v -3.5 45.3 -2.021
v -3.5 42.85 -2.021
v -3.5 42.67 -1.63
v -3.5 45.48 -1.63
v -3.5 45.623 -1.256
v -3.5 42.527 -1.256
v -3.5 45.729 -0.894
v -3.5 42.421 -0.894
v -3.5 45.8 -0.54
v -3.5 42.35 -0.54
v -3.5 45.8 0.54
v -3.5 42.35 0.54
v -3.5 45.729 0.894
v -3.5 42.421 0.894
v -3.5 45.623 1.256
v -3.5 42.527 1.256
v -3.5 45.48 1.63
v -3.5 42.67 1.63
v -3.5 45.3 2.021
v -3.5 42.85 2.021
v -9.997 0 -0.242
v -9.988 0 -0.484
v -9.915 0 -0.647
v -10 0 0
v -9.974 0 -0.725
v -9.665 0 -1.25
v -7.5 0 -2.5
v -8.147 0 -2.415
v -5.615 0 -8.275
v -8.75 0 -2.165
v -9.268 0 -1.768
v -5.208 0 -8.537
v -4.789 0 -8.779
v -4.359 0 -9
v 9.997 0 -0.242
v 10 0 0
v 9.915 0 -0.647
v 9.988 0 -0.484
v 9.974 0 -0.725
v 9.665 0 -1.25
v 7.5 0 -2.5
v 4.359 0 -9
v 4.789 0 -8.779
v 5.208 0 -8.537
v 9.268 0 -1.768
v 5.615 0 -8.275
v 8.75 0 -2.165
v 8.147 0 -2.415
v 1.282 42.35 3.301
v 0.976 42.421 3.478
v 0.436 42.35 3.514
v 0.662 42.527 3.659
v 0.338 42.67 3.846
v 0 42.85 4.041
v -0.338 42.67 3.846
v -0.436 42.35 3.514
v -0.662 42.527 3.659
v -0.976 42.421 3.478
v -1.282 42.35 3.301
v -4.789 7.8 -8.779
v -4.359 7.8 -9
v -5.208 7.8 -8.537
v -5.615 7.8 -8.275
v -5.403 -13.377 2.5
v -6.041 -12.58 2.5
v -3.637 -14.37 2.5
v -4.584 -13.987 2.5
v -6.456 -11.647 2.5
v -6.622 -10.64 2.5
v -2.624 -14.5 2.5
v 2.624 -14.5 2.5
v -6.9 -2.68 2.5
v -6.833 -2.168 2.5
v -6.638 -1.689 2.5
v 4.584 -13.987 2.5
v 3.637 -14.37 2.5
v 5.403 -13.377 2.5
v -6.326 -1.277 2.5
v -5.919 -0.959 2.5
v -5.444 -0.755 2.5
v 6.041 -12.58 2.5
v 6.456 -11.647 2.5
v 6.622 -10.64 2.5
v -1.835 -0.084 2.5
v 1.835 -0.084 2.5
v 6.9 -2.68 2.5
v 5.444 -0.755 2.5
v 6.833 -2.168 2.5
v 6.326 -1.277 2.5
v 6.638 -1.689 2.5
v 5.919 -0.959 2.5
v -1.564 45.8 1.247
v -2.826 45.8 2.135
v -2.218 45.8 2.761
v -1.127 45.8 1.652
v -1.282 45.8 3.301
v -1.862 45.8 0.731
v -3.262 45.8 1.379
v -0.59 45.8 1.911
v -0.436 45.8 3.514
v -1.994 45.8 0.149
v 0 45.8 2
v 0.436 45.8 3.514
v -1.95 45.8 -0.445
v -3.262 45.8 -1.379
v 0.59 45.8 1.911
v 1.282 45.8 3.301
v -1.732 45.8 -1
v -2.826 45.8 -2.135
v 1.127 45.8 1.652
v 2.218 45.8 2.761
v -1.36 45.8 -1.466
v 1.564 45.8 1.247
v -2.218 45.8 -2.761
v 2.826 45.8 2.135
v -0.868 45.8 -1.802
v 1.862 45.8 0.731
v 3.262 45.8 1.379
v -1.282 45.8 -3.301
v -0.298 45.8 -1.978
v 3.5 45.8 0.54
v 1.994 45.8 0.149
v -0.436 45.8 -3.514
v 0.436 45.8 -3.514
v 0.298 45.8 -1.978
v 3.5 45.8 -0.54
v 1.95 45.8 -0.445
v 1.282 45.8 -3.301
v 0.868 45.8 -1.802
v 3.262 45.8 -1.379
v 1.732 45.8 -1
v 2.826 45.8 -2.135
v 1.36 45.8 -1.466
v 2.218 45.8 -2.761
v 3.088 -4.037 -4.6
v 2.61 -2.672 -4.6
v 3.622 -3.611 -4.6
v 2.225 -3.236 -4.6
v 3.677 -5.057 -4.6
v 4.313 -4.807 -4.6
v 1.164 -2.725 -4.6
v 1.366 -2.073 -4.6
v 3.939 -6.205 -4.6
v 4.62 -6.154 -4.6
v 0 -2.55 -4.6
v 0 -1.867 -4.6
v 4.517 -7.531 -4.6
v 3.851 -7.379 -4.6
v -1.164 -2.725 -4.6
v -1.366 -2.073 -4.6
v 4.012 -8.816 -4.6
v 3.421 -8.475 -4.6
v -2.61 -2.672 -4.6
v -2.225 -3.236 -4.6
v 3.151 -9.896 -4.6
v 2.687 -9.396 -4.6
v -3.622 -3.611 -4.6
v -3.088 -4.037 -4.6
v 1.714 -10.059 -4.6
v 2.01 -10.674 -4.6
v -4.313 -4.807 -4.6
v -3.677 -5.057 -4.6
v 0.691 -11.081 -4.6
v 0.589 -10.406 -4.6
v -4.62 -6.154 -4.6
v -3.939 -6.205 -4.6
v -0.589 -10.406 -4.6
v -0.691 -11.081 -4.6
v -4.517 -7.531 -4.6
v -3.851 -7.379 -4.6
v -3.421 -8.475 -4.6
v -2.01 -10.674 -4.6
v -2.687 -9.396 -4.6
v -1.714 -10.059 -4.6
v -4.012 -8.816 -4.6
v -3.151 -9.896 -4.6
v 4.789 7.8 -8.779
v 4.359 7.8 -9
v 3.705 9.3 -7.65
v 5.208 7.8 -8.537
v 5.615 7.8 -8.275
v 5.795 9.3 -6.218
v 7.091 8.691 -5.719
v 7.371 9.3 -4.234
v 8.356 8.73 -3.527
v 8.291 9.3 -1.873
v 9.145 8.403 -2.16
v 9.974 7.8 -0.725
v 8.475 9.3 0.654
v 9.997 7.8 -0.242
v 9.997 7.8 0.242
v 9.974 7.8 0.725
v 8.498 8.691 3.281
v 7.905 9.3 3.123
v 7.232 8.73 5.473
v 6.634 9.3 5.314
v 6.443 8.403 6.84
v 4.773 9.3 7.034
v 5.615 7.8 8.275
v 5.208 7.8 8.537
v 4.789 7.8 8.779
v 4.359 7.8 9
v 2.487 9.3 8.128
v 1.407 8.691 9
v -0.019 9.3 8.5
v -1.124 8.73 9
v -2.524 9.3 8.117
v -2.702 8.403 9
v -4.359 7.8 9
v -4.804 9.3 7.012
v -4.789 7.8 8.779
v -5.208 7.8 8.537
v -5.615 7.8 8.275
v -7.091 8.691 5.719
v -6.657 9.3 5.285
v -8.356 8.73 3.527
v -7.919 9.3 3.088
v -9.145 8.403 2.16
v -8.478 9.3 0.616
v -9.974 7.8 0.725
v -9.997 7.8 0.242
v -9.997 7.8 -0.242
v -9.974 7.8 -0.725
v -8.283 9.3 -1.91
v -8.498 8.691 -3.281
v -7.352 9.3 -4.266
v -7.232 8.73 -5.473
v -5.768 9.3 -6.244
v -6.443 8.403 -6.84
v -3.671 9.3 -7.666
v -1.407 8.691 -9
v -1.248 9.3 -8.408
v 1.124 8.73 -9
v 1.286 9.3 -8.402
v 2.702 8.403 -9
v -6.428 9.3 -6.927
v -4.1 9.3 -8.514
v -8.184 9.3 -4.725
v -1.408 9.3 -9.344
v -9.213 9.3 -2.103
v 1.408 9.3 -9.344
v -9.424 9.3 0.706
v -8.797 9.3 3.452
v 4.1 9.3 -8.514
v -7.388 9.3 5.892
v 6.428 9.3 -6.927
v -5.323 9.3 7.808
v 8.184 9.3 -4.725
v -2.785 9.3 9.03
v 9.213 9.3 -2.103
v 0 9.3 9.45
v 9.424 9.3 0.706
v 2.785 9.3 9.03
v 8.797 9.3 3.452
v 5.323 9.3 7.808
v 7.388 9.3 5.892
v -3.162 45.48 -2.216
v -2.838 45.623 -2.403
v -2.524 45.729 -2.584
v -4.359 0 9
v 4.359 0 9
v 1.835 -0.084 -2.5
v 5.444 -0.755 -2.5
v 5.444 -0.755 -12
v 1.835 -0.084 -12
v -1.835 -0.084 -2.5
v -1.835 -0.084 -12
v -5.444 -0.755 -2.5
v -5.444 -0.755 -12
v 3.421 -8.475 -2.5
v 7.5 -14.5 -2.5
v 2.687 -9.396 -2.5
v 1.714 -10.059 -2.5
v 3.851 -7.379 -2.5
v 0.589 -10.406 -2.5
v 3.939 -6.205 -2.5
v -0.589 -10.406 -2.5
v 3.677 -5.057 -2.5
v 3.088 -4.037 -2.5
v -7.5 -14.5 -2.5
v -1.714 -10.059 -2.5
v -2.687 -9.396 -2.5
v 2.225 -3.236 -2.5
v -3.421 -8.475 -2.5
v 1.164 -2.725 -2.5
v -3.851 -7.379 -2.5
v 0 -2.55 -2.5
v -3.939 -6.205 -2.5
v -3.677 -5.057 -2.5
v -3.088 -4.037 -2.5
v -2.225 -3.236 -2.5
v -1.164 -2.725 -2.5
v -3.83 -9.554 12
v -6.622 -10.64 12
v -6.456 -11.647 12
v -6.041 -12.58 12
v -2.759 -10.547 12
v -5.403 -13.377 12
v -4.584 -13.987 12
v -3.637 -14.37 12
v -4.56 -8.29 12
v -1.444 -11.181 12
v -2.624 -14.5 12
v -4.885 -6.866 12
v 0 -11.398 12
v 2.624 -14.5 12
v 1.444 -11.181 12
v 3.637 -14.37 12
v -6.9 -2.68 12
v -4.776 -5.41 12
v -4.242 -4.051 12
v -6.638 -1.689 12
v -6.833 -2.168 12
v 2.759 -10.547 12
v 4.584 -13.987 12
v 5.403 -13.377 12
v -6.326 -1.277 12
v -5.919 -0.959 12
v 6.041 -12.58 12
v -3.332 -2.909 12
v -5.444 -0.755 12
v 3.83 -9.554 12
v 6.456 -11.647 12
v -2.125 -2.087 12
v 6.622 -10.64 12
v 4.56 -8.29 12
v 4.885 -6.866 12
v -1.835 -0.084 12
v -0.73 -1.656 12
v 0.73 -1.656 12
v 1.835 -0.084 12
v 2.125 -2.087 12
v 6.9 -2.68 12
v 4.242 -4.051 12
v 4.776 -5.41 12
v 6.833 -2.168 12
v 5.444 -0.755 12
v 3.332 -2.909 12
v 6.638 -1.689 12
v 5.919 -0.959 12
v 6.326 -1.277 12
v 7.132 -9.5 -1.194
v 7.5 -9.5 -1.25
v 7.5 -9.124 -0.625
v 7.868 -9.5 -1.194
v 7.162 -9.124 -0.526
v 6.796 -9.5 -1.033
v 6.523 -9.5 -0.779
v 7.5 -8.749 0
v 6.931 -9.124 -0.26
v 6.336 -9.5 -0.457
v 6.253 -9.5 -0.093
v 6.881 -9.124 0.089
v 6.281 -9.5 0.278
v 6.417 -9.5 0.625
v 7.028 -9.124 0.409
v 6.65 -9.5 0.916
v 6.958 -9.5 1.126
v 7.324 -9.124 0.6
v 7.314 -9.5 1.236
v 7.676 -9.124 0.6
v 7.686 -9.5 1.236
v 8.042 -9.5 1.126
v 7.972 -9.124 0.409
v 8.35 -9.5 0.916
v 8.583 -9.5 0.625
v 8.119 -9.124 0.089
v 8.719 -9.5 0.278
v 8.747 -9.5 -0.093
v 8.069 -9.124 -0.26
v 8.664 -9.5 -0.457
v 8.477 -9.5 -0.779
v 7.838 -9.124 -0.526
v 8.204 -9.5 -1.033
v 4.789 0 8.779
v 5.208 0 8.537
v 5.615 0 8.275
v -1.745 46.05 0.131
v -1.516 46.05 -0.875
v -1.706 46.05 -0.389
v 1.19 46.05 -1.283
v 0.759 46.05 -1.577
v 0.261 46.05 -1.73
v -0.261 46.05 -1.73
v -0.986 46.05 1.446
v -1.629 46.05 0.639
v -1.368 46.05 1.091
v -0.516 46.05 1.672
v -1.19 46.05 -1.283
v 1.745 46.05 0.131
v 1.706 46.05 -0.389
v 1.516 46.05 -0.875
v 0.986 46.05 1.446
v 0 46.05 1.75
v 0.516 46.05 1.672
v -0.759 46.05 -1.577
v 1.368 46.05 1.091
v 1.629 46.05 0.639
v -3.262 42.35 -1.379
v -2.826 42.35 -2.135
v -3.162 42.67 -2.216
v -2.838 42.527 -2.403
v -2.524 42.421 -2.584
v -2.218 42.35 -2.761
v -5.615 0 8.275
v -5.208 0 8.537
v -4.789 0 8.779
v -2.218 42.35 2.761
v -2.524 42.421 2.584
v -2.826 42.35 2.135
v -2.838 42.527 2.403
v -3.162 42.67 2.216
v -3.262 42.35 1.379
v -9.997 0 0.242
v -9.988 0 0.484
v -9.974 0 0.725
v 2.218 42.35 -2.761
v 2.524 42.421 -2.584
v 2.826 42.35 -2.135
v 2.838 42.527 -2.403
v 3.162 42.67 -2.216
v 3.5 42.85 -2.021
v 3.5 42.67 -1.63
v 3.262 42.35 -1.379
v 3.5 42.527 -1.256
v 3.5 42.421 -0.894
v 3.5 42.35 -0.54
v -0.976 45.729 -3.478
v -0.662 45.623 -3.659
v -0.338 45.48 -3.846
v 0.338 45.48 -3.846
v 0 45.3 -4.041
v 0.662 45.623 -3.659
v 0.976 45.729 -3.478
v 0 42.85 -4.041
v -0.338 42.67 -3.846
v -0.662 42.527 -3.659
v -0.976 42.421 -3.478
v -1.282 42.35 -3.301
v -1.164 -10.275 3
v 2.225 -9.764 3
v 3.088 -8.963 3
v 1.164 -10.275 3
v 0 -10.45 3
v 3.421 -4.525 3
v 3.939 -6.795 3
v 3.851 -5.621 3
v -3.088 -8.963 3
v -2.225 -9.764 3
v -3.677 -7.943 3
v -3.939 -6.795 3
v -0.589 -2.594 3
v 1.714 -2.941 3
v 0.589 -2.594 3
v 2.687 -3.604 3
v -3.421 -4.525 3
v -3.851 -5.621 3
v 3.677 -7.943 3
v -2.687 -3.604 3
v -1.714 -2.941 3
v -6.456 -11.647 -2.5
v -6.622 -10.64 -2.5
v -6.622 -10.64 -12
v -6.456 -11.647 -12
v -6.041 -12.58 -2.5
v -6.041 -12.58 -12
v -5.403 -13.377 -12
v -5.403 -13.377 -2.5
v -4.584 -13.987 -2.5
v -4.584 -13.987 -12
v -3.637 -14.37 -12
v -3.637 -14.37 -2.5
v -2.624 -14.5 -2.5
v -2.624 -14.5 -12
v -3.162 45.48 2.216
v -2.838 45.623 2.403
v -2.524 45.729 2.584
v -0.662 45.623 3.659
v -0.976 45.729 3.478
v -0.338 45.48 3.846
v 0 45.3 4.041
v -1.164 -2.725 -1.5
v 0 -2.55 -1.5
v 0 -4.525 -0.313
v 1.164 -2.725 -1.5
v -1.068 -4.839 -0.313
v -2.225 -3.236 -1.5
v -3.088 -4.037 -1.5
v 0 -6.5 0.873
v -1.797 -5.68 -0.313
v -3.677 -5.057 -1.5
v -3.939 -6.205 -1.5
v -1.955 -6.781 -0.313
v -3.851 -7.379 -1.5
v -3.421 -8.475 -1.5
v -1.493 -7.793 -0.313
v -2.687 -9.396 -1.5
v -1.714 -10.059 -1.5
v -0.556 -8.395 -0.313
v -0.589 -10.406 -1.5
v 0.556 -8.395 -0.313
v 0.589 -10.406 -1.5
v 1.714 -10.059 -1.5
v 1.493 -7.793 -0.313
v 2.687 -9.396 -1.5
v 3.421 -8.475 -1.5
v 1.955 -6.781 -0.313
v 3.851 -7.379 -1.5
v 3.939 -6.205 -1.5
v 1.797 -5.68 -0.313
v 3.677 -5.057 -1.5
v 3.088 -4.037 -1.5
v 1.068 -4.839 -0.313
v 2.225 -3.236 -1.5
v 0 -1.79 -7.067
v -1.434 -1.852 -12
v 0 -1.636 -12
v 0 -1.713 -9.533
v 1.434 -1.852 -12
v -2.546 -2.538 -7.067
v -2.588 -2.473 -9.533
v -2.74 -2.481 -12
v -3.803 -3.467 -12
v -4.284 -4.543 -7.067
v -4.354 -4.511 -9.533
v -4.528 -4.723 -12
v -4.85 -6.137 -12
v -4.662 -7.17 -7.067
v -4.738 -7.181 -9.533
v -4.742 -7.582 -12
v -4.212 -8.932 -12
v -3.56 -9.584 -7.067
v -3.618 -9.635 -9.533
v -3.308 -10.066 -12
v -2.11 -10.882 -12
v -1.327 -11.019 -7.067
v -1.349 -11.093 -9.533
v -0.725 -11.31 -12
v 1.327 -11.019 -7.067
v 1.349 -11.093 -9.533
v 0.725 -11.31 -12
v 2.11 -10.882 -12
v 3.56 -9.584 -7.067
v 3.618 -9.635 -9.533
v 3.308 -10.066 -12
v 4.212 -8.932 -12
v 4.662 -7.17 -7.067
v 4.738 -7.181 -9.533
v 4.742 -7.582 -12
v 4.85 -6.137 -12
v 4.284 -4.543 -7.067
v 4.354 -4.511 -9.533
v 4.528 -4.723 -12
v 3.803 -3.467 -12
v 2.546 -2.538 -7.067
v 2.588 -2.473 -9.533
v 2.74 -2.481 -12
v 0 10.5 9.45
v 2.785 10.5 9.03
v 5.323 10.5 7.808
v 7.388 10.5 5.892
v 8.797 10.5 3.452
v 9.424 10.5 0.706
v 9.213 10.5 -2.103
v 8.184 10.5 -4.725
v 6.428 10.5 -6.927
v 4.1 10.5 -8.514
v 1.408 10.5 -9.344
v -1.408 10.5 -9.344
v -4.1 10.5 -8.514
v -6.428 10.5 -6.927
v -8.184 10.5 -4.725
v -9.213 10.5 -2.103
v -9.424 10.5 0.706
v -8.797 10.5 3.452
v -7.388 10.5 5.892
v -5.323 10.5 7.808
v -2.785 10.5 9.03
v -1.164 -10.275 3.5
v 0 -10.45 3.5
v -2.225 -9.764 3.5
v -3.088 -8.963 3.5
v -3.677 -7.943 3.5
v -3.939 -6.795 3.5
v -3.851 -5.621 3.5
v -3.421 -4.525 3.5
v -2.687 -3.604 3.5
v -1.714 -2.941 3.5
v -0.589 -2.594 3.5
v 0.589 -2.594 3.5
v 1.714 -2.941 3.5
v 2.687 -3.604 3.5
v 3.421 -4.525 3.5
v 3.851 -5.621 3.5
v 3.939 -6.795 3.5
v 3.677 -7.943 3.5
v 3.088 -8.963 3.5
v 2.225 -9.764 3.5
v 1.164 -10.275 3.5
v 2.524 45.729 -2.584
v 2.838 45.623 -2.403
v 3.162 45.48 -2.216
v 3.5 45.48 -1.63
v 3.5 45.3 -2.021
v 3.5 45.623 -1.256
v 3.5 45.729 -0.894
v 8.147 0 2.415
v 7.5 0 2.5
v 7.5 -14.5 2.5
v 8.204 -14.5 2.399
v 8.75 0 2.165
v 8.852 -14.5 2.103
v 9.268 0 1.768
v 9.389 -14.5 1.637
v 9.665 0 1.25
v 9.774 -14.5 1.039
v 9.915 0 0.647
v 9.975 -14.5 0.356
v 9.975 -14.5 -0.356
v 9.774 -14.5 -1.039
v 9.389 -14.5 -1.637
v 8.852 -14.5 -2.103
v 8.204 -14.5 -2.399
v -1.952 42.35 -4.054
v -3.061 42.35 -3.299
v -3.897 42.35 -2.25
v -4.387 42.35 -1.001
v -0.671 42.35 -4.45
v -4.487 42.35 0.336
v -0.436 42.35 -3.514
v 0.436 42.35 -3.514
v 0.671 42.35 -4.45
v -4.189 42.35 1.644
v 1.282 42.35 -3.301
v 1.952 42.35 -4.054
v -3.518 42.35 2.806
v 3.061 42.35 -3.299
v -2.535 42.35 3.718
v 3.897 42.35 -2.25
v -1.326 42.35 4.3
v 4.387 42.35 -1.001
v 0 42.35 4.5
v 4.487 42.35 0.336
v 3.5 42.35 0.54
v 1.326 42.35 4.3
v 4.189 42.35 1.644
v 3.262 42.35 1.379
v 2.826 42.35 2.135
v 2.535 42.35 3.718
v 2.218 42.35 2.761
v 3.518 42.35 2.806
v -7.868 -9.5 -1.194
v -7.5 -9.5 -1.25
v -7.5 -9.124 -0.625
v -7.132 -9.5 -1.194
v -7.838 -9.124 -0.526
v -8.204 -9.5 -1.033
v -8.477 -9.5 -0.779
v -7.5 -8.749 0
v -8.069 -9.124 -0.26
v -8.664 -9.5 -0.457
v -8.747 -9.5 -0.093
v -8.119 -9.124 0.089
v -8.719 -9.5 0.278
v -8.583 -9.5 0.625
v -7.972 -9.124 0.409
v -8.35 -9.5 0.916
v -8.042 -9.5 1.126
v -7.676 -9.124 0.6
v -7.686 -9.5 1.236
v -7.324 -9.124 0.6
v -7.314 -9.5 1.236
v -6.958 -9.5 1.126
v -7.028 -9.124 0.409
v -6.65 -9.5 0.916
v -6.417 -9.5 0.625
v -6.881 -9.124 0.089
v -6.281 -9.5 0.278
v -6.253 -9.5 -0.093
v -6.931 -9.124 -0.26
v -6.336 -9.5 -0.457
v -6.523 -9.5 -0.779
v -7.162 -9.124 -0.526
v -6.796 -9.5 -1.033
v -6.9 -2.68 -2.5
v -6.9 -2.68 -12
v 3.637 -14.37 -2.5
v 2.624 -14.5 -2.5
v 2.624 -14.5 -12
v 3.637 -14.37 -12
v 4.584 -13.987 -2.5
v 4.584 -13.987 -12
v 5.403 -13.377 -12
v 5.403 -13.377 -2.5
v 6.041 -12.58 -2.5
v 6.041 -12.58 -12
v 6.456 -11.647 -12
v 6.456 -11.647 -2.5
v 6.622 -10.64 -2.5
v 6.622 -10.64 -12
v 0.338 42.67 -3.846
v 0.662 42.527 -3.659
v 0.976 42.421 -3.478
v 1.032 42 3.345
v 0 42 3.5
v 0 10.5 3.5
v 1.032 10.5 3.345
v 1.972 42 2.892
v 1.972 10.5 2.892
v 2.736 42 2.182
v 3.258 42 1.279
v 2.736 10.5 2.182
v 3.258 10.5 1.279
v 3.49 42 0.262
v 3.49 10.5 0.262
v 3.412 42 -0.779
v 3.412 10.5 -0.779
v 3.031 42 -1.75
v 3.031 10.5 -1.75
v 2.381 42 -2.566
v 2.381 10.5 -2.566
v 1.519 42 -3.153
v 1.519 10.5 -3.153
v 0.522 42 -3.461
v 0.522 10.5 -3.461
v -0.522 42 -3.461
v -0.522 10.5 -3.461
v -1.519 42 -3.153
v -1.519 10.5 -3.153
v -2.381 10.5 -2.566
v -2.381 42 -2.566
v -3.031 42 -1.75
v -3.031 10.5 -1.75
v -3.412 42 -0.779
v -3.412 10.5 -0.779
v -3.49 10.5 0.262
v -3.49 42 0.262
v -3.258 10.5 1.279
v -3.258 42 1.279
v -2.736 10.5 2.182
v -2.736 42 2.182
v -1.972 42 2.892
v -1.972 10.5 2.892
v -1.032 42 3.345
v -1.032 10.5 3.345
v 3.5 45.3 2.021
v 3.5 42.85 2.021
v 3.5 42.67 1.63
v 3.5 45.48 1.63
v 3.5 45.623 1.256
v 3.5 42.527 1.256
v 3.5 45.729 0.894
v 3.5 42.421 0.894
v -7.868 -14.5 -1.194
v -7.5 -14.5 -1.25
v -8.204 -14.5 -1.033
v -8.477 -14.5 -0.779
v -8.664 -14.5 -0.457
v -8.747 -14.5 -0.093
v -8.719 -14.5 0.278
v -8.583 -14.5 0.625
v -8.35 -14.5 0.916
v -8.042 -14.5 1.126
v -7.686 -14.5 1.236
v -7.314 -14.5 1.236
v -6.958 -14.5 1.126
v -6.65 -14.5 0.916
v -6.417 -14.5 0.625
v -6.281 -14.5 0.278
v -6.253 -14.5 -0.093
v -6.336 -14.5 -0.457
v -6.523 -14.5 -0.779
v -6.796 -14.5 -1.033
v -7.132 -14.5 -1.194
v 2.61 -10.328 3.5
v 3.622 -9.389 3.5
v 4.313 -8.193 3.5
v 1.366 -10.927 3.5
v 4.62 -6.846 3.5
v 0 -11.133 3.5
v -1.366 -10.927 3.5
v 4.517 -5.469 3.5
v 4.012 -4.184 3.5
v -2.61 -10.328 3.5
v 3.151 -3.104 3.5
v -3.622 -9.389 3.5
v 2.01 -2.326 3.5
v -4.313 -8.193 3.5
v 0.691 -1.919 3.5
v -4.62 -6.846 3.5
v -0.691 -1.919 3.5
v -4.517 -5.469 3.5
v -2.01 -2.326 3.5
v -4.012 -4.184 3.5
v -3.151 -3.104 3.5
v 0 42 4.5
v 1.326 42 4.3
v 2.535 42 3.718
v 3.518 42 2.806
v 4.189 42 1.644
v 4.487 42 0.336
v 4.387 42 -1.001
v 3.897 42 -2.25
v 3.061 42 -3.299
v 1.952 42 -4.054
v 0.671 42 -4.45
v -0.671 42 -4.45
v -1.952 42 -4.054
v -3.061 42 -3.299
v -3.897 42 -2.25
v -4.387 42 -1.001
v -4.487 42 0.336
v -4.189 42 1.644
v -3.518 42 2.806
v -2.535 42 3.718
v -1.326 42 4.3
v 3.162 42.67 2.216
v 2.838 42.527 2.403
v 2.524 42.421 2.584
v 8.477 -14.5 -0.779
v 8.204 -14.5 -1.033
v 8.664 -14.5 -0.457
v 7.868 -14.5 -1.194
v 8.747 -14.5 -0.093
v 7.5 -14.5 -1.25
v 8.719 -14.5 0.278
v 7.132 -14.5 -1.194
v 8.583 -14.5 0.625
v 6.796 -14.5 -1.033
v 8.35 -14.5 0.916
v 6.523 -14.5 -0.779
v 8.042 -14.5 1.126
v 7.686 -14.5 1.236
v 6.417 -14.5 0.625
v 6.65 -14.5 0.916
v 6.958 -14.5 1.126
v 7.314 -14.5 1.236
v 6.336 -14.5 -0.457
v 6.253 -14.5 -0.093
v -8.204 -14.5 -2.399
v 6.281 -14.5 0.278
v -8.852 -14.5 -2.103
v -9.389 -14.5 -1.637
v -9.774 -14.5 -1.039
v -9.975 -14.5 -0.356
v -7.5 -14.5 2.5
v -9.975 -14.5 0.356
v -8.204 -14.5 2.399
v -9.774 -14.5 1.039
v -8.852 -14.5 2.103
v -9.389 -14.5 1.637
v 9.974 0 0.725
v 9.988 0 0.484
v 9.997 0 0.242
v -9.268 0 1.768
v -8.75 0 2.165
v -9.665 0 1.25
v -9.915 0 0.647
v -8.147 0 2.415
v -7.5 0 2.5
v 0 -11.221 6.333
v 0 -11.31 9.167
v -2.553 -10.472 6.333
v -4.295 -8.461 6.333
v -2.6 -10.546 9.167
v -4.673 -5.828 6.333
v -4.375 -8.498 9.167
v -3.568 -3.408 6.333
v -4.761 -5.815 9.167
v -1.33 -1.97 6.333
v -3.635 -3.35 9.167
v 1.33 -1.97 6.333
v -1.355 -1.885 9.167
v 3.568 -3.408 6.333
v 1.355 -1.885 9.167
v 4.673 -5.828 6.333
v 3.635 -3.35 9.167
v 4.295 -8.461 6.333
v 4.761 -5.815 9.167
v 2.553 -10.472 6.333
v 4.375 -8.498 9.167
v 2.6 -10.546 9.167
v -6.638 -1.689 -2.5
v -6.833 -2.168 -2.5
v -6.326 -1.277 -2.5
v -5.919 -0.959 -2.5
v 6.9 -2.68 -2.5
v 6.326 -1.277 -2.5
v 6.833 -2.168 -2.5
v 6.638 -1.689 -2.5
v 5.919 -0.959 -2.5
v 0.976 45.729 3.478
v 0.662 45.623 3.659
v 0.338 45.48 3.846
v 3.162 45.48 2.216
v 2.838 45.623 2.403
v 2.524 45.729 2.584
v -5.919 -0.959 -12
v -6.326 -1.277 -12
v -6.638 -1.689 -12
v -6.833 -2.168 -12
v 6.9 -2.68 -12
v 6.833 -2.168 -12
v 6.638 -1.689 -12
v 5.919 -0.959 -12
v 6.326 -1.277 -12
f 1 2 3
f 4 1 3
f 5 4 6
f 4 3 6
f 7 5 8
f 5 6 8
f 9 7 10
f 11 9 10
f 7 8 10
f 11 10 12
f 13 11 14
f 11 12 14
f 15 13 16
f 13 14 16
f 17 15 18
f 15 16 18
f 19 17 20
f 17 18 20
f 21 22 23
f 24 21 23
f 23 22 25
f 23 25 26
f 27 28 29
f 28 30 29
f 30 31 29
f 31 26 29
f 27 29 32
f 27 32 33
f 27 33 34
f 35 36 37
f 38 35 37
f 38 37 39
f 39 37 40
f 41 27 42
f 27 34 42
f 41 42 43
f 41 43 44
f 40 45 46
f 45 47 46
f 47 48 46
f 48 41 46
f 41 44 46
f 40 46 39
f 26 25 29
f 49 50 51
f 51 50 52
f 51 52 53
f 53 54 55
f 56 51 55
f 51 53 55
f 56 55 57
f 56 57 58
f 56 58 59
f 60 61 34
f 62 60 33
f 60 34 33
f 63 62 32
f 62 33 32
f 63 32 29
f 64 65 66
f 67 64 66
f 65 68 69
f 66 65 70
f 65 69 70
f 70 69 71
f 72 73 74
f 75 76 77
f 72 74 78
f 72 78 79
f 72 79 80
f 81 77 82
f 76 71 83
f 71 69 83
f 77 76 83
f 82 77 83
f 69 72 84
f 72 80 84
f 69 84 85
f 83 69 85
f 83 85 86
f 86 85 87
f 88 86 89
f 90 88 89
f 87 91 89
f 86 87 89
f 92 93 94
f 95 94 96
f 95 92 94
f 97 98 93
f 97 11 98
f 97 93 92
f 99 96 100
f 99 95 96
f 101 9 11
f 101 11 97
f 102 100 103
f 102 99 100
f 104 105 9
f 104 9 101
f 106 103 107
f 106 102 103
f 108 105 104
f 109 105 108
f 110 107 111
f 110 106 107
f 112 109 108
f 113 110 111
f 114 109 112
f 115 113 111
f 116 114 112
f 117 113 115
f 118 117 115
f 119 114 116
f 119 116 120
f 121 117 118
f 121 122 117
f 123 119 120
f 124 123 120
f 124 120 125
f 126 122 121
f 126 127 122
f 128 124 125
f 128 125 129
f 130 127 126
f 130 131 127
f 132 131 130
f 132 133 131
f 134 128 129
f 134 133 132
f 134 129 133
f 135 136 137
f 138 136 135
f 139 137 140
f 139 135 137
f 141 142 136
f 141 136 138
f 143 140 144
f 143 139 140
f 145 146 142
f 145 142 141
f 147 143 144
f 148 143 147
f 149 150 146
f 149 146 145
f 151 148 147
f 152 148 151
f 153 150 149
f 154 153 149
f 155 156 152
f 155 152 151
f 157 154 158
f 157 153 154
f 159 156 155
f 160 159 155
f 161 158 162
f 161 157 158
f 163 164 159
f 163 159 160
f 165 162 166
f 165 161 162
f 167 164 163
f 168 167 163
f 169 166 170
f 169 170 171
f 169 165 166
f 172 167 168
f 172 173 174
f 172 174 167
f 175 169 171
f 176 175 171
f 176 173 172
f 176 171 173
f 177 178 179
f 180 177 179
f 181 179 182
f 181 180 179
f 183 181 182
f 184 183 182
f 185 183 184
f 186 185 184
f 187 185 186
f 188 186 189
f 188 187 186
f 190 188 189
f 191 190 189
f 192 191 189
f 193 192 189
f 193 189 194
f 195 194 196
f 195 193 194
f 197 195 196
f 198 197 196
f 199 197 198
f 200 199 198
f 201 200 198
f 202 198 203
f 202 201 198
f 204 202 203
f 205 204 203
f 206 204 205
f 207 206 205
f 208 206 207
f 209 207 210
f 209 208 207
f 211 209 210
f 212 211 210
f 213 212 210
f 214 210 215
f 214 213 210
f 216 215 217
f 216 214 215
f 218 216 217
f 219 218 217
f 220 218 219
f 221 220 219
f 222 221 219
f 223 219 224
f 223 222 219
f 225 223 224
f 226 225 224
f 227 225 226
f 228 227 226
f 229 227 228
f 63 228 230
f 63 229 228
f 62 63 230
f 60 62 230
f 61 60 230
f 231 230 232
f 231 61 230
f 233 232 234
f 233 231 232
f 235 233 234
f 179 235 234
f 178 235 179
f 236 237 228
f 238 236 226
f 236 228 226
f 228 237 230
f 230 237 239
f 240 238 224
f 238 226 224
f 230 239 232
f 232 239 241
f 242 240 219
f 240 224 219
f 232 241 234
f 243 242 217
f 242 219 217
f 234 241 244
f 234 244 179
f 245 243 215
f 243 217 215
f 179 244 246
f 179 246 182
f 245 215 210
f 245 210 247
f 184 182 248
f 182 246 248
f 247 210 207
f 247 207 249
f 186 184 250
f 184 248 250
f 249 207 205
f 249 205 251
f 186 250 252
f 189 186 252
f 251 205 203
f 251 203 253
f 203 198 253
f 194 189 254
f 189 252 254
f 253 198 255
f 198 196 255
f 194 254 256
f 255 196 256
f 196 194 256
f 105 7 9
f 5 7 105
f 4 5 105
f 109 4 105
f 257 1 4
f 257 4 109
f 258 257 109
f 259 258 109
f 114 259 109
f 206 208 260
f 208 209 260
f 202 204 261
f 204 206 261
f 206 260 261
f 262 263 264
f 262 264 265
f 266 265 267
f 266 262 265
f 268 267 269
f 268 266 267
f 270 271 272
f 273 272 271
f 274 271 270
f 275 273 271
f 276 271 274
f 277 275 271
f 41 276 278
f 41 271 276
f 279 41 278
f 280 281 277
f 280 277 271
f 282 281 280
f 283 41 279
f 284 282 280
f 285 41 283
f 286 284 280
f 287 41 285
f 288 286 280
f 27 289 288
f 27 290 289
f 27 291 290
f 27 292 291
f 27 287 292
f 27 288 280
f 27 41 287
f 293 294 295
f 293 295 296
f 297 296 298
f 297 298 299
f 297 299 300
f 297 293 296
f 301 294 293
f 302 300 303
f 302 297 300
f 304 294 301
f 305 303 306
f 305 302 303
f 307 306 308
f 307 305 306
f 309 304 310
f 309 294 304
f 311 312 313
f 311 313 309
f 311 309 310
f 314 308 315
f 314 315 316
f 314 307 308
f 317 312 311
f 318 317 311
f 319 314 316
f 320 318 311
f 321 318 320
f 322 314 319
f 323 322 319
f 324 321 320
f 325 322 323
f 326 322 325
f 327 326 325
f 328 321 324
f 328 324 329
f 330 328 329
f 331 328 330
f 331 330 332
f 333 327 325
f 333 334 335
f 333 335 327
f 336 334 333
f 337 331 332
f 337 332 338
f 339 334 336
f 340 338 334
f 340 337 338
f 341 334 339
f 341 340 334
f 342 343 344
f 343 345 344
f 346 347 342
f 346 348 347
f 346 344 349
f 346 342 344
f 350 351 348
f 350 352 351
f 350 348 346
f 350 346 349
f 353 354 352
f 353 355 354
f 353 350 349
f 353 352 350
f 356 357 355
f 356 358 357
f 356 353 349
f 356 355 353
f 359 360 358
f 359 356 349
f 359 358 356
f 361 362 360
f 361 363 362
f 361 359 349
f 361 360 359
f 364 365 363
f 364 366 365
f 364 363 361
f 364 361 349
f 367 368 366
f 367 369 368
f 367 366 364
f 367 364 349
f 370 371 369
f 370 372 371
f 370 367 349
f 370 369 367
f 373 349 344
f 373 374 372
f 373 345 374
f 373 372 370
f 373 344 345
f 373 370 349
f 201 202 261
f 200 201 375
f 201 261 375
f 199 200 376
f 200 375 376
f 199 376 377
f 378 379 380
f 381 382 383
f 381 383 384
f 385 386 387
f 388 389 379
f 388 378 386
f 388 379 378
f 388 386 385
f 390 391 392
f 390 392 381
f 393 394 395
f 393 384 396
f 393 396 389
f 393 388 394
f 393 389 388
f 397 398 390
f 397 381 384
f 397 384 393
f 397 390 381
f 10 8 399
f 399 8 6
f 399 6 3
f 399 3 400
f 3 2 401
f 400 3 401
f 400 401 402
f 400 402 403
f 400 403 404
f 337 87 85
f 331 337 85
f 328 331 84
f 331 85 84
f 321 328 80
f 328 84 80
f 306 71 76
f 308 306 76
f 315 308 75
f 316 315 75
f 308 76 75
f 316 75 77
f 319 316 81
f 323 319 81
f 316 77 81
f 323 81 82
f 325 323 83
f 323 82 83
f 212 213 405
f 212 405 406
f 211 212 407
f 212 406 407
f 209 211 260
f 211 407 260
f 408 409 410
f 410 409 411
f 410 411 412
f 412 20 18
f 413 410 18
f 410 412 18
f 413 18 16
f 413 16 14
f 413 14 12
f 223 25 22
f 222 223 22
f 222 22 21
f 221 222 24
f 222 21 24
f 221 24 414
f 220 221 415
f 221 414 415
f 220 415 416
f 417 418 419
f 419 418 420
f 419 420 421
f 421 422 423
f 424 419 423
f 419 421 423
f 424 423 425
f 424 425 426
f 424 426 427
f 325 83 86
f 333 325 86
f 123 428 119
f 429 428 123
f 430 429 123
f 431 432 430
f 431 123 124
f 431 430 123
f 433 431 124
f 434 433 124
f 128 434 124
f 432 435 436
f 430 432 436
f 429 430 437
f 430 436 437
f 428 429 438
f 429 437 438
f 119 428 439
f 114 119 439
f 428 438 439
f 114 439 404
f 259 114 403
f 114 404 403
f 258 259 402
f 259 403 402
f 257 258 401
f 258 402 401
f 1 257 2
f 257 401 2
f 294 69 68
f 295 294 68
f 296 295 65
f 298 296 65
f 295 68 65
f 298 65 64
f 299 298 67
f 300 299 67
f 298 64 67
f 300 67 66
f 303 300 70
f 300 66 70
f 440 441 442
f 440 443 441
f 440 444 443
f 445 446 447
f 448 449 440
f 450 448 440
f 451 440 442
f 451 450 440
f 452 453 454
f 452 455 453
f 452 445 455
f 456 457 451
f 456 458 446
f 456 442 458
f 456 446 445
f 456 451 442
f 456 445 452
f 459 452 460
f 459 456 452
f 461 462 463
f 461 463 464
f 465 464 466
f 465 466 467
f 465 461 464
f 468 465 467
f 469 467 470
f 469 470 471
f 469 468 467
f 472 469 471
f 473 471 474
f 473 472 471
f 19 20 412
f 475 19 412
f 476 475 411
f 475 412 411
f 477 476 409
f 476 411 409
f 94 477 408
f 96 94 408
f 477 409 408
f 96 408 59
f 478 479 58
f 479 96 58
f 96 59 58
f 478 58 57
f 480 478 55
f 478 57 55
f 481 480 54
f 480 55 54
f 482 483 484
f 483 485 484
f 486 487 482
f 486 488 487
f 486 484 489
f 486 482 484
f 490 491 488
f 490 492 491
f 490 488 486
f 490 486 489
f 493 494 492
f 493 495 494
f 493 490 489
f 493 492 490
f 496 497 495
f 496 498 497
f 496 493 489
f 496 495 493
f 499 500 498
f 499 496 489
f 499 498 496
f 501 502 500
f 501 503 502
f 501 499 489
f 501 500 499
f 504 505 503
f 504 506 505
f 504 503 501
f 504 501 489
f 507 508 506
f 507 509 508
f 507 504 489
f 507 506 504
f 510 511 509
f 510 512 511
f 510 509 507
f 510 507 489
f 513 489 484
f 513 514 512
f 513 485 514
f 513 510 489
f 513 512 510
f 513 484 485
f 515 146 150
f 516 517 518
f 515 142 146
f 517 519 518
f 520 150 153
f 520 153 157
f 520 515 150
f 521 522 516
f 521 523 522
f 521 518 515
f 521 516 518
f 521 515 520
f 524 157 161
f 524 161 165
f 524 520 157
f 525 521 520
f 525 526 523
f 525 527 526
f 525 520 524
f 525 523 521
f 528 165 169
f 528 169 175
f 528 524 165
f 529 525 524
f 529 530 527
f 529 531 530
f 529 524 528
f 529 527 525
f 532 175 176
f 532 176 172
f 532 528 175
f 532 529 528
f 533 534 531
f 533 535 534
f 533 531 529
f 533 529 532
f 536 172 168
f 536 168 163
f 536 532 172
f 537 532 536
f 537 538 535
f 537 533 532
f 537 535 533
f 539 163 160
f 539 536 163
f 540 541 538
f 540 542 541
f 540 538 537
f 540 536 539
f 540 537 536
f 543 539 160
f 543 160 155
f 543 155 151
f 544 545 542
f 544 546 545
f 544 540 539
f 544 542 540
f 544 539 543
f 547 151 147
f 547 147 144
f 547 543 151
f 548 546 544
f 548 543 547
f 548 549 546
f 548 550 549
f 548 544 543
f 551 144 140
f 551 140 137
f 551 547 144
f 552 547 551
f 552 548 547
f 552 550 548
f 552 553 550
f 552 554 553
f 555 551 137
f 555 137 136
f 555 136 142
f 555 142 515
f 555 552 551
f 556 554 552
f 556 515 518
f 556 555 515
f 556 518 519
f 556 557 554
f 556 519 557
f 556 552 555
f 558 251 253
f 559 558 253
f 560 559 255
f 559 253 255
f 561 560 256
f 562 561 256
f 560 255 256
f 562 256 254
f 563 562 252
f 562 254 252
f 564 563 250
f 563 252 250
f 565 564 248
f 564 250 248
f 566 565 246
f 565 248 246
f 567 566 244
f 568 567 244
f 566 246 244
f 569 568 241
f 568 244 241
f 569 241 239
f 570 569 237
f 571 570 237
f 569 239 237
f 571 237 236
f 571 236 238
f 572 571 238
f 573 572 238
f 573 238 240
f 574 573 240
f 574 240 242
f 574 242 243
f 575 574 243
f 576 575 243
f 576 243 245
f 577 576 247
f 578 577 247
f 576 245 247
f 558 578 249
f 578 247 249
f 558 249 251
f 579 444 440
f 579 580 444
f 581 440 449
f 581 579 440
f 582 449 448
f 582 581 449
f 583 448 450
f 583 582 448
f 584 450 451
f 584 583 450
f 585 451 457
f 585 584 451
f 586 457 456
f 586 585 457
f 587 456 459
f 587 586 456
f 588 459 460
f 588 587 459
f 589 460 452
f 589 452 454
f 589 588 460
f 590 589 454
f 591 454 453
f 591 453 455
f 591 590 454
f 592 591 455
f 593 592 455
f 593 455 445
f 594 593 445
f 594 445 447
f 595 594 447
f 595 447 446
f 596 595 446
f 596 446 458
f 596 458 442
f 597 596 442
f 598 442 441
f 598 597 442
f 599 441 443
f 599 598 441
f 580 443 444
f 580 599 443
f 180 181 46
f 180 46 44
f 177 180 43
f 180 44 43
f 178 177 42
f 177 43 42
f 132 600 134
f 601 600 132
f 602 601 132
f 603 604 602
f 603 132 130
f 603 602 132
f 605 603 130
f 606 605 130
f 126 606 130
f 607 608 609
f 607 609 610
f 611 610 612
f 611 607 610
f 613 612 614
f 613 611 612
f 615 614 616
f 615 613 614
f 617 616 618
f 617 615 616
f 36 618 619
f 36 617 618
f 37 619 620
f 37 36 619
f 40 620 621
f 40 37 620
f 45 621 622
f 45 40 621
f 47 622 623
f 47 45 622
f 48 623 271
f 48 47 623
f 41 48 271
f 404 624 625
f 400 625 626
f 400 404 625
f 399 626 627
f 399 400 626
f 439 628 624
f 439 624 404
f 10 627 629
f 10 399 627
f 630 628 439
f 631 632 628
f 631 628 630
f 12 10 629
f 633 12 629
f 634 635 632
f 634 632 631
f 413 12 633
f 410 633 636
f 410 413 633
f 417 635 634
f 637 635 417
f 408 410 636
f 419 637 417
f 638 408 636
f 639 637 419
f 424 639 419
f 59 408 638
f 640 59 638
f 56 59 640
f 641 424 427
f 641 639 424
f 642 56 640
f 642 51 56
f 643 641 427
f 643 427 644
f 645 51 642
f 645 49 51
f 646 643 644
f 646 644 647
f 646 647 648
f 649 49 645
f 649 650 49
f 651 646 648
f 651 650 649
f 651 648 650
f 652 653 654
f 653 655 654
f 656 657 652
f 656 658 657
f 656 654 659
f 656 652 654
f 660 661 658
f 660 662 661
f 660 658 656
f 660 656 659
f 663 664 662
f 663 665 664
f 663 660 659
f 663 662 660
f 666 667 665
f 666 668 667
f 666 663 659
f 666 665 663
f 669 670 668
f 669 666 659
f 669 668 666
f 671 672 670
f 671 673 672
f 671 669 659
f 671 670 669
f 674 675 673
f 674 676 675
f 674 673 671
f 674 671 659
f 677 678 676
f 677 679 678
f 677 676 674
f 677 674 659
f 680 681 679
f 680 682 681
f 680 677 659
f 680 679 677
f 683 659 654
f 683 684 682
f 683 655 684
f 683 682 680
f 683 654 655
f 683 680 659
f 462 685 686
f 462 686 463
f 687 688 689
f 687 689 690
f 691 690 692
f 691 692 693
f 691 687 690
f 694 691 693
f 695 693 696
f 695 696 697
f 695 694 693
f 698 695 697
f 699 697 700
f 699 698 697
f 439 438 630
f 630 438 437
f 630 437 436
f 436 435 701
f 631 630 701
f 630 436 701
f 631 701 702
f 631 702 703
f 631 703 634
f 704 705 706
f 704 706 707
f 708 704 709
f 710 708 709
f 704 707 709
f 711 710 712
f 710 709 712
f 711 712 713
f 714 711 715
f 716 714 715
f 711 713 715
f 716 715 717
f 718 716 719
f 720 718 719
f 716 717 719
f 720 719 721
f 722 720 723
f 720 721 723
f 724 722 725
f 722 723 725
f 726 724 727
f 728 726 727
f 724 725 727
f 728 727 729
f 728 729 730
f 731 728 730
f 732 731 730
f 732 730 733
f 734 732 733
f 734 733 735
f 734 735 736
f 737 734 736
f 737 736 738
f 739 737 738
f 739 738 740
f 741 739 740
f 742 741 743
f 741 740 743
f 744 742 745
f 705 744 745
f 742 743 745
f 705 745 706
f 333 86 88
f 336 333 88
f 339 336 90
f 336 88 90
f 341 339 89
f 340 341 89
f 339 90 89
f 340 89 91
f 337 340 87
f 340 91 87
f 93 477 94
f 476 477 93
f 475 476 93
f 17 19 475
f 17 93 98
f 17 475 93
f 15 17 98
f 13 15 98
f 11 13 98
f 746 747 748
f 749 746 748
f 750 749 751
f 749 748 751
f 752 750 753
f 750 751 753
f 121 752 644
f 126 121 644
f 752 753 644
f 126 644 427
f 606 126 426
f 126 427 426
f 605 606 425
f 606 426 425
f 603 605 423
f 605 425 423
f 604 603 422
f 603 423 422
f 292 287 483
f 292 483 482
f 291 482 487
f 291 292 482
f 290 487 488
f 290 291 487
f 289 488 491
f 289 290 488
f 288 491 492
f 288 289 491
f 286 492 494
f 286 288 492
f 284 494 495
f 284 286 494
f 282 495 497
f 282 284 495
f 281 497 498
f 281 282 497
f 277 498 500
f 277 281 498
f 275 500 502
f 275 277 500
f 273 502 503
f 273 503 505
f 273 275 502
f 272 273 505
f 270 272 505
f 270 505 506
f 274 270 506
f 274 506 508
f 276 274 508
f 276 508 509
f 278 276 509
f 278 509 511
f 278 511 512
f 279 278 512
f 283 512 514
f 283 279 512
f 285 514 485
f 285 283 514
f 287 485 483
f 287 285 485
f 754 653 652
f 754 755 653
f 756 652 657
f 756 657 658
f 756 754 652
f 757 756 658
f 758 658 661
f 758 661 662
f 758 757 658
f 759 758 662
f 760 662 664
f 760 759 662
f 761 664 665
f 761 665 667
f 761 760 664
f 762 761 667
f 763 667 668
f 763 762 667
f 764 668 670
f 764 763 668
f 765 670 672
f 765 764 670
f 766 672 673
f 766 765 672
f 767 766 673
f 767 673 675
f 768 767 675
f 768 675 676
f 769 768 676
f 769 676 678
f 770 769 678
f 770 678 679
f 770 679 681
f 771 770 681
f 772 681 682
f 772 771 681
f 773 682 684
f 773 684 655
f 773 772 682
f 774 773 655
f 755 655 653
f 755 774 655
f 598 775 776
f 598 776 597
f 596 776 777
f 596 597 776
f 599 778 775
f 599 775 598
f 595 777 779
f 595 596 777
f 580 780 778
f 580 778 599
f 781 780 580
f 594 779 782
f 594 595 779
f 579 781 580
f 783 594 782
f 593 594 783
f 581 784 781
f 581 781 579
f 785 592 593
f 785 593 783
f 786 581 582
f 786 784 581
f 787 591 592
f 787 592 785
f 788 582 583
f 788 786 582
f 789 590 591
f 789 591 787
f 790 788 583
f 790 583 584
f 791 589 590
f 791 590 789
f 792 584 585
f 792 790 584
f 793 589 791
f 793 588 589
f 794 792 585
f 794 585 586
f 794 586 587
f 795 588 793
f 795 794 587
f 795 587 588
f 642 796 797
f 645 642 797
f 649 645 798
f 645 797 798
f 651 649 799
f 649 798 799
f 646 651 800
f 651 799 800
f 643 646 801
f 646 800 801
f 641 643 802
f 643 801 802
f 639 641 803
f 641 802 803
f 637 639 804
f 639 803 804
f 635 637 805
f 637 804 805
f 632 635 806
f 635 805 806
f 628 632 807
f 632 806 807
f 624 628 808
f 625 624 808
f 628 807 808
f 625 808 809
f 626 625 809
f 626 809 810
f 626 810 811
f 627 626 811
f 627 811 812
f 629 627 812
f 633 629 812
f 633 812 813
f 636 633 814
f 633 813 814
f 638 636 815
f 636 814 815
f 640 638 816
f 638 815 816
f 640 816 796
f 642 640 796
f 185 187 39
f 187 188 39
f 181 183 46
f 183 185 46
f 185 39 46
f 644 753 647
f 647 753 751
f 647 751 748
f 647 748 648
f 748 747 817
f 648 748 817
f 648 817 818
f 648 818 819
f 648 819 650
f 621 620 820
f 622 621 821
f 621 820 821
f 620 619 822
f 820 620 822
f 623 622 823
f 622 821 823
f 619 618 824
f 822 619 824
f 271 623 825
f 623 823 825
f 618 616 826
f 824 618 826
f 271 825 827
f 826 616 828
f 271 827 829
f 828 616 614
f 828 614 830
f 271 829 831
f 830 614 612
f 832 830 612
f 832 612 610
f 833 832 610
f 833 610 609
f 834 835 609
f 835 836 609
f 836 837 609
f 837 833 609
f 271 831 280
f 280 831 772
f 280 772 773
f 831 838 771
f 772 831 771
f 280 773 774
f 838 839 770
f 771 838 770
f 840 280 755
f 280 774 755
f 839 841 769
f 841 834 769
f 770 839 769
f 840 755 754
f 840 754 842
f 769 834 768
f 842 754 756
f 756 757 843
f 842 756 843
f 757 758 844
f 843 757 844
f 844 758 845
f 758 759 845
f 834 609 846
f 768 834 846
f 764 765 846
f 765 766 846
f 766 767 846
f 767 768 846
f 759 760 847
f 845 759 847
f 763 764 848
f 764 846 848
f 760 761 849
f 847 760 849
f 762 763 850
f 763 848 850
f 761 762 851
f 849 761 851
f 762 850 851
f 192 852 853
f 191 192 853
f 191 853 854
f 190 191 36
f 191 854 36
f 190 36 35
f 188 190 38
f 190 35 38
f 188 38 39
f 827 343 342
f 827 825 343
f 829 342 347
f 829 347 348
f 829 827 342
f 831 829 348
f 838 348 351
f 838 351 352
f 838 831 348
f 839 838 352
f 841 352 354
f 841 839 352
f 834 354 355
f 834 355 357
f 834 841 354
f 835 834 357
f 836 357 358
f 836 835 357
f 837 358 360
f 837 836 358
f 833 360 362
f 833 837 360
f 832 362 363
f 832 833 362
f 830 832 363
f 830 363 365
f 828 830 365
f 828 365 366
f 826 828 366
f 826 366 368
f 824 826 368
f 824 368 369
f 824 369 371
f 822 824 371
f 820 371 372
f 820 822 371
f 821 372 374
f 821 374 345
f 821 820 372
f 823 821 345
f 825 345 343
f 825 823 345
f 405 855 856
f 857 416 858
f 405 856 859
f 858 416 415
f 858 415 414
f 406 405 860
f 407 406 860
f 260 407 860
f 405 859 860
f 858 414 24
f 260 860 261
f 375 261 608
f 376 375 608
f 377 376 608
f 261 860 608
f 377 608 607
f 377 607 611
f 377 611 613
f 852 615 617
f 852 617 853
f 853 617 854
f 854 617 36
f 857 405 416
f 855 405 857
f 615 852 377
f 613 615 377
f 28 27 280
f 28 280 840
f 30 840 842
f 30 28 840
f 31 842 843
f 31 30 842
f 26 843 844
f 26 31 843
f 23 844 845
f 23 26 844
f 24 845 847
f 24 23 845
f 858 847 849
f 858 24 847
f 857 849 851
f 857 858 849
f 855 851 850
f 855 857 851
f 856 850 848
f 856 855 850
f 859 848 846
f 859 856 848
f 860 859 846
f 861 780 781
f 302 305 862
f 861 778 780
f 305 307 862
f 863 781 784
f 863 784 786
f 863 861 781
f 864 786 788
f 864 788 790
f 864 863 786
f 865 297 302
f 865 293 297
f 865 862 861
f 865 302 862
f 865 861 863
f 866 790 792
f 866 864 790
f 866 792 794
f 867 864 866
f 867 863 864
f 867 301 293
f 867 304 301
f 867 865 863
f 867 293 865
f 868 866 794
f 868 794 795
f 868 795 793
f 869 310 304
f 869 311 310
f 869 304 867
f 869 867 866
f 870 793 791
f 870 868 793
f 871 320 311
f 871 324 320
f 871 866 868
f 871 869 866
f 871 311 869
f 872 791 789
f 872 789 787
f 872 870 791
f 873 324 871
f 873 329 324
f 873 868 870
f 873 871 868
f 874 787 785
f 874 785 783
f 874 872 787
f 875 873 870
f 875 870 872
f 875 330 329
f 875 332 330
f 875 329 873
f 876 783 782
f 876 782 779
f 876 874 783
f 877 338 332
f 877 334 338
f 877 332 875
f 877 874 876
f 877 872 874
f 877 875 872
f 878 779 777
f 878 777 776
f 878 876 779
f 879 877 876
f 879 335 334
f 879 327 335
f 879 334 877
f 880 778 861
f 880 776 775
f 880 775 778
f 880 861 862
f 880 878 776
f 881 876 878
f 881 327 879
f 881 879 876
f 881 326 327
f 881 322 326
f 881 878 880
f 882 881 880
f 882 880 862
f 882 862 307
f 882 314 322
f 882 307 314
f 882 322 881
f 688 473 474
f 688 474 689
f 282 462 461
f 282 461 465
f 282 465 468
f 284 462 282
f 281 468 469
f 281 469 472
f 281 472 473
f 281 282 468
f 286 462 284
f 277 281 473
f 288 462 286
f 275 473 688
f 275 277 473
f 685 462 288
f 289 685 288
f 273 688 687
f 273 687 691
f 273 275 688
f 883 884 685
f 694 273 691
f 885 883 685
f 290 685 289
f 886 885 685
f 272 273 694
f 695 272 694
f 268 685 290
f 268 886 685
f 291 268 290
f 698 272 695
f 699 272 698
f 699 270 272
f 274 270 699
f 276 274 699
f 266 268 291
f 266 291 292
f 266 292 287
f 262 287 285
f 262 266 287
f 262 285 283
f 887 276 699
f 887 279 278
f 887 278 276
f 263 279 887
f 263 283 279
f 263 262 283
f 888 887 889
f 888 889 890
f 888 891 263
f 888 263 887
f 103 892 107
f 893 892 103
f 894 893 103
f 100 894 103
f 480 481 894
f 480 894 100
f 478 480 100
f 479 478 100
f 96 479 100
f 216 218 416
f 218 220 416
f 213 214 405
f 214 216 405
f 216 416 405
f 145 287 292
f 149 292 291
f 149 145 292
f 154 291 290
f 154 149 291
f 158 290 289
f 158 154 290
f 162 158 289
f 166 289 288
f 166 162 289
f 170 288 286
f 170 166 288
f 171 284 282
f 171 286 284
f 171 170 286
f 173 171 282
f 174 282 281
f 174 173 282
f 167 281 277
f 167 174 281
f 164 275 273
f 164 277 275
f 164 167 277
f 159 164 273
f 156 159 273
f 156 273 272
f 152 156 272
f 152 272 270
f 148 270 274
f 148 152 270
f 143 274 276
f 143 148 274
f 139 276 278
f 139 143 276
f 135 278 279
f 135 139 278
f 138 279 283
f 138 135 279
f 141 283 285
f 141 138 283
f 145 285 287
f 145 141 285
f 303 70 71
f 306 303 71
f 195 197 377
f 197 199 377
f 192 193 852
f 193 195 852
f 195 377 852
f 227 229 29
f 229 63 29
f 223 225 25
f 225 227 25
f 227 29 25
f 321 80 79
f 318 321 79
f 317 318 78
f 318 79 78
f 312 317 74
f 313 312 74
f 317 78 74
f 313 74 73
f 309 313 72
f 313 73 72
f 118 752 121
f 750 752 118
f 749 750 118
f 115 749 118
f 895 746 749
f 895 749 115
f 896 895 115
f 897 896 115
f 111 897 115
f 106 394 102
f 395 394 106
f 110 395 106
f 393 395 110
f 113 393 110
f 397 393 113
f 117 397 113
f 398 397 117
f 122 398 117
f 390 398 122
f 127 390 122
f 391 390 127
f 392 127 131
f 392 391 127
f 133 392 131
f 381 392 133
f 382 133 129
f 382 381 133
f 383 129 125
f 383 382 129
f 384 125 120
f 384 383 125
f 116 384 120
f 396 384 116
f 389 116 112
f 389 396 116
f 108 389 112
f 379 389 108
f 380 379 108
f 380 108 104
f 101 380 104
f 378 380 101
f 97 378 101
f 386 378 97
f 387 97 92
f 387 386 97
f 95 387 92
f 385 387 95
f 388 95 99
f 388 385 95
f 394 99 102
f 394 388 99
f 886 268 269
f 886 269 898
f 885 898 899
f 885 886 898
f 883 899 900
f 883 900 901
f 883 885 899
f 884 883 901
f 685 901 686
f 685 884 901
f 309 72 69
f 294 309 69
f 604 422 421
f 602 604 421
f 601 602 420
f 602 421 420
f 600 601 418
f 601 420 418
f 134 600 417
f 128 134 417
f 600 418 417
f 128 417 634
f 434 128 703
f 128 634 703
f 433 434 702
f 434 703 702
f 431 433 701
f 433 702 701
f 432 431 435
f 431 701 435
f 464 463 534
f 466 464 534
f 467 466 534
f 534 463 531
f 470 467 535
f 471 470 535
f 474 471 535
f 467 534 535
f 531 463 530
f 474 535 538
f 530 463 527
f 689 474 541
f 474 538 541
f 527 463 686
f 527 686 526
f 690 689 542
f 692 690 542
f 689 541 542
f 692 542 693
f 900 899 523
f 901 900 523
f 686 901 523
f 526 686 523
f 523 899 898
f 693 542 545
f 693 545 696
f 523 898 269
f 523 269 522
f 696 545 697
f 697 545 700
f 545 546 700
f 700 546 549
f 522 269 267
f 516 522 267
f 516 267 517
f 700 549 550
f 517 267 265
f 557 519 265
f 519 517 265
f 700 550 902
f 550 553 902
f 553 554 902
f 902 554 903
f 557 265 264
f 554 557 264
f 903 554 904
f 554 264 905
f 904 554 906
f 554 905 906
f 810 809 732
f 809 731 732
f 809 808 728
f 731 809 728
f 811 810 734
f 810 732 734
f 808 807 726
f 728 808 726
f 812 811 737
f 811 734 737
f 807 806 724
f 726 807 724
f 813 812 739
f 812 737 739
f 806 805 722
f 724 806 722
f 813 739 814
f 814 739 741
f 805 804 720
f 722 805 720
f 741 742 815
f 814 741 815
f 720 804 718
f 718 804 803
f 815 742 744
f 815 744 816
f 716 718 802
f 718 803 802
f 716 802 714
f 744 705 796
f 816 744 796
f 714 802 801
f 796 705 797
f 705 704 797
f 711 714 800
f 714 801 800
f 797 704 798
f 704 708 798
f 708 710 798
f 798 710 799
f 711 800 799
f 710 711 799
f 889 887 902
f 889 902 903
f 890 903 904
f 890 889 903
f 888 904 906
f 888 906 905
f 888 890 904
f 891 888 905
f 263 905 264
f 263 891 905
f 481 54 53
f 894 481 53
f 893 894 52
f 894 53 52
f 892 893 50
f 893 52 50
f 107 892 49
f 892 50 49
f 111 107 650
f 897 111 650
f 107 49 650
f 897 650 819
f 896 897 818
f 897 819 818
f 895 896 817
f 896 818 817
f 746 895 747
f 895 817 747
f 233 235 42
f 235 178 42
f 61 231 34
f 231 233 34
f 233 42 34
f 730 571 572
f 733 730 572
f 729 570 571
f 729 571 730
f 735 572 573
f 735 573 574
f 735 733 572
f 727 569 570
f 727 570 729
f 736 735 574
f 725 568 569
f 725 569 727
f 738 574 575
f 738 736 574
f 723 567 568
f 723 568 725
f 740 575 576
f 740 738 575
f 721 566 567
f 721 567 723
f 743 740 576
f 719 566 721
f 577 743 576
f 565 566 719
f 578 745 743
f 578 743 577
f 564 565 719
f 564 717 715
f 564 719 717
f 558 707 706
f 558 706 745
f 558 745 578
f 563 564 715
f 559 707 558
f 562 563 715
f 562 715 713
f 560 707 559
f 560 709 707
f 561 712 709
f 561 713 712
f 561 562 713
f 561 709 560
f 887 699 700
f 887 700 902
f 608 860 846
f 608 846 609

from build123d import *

# Parameters (mm, degrees)
BASE_NUT_EXTRUDE_DEPTH       = 9.3
SKETCH3_R                    = 9.45
COIL_BASE_DEPTH              = 1.2
SKETCH4_R                    = 3.5
INNER_CYLINDER_DEPTH         = 31.5
SKETCH5_R                    = 4.5
WASHER_DEPTH                 = 0.35
SKETCH6_R                    = 2
MOUNTING_THREAD_DEPTH        = 3.7
THREAD_CHAMFER_SIZE          = 0.25
PORT_BASE_DEPTH              = 14.5
IN_PORT_BODY_DEPTH           = 9.5
OUT_PORT_BODY_DEPTH          = 9.5
M3_MOUNTING_HOLES_AT_2_COUNT = 2
M3_MOUNTING_HOLES_AT_2_PITCH = 15
SKETCH21_R                   = 2
HEX_NUT_DEPTH                = 3.45


with BuildPart() as part:
    # Sketch1 → Base Nut Extrude (new body)
    with BuildSketch(Plane(origin=(0, 0, 0), x_dir=(1, 0, 0), z_dir=(0, 1, 0))):
        with BuildLine():
            Line((-9.973678106, -0.725082782), (-5.614779162, -8.274917218))
            ThreePointArc((-5.614779162, -8.274917218), (-5, -8.660254038), (-4.358898944, -9))
            Line((-4.358898944, -9), (4.358898944, -9))
            ThreePointArc((4.358898944, -9), (5, -8.660254038), (5.614779162, -8.274917218))
            Line((5.614779162, -8.274917218), (9.973678106, -0.725082782))
            ThreePointArc((9.973678106, -0.725082782), (10, 0), (9.973678106, 0.725082782))
            Line((9.973678106, 0.725082782), (5.614779162, 8.274917218))
            ThreePointArc((5.614779162, 8.274917218), (5, 8.660254038), (4.358898944, 9))
            Line((4.358898944, 9), (-4.358898944, 9))
            ThreePointArc((-4.358898944, 9), (-5, 8.660254038), (-5.614779162, 8.274917218))
            Line((-5.614779162, 8.274917218), (-9.973678106, 0.725082782))
            ThreePointArc((-9.973678106, 0.725082782), (-10, 0), (-9.973678106, -0.725082782))
        make_face()
    extrude(amount=BASE_NUT_EXTRUDE_DEPTH)

    # Sketch2 → Nut Detail (revolve, cut)
    with BuildSketch(Plane.XY, mode=Mode.PRIVATE) as nut_detail_sk:
        Polygon((-9.973678106, 9.3), (-8.5, 9.3), (-10, 7.8), (-10, 9.3), align=None)
    revolve(nut_detail_sk.sketch.rotate(Axis((0, 49.0775, 0), (0, -1, 0)), 115.841932763), axis=Axis((0, 49.0775, 0), (0, -1, 0)), mode=Mode.SUBTRACT)

    # Sketch3 → Coil Base (add)
    with BuildSketch(Plane(origin=(0, 9.3, 0), x_dir=(1, 0, 0), z_dir=(0, 1, 0))):
        with Locations(Location((0, 0, 0), (0, 0, 270))):
            Circle(SKETCH3_R)
    extrude(amount=COIL_BASE_DEPTH)

    # Sketch4 → Inner Cylinder (add)
    with BuildSketch(Plane(origin=(0, 10.5, 0), x_dir=(1, 0, 0), z_dir=(0, 1, 0))):
        with Locations(Location((0, 0, 0), (0, 0, 270))):
            Circle(SKETCH4_R)
    extrude(amount=INNER_CYLINDER_DEPTH)

    # Sketch5 → Washer (add)
    with BuildSketch(Plane(origin=(0, 42, 0), x_dir=(1, 0, 0), z_dir=(0, 1, 0))):
        with Locations(Location((0, 0, 0), (0, 0, 270))):
            Circle(SKETCH5_R)
    extrude(amount=WASHER_DEPTH)

    # Sketch6 → Mounting Thread (add)
    with BuildSketch(Plane(origin=(0, 42.35, 0), x_dir=(1, 0, 0), z_dir=(0, 1, 0))):
        with Locations(Location((0, 0, 0), (0, 0, 270))):
            Circle(SKETCH6_R)
    extrude(amount=MOUNTING_THREAD_DEPTH)

    # Thread Chamfer
    thread_chamfer_edges = [part.edges().sort_by_distance(p)[0] for p in [
        (0, 46.05, -2),
    ]]
    chamfer(thread_chamfer_edges, length=THREAD_CHAMFER_SIZE)

    # Sketch7 → Port Base (add)
    with BuildSketch(Plane.XZ):
        with BuildLine():
            Line((-7.5, 2.5), (7.5, 2.5))
            ThreePointArc((7.5, 2.5), (10, 0), (7.5, -2.5))
            Line((7.5, -2.5), (-7.5, -2.5))
            ThreePointArc((-7.5, -2.5), (-10, 0), (-7.5, 2.5))
        make_face()
    extrude(amount=PORT_BASE_DEPTH)


with BuildPart() as body_2:
    # Sketch8 → In Port Body (new body)
    with BuildSketch(Plane.XY.offset(2.5)):
        with BuildLine():
            Line((-6.9, -2.679780602), (-6.622037052, -10.639597987))
            ThreePointArc((-6.622037052, -10.639597987), (-5.403107226, -13.377359201), (-2.624473744, -14.5))
            Line((-2.624473744, -14.5), (2.624473744, -14.5))
            ThreePointArc((2.624473744, -14.5), (5.403107226, -13.377359201), (6.622037052, -10.639597987))
            Line((6.622037052, -10.639597987), (6.9, -2.679780602))
            ThreePointArc((6.9, -2.679780602), (6.495131482, -1.47331653), (5.444444444, -0.75531178))
            ThreePointArc((5.444444444, -0.75531178), (0, 0), (-5.444444444, -0.75531178))
            ThreePointArc((-5.444444444, -0.75531178), (-6.495131482, -1.47331653), (-6.9, -2.679780602))
        make_face()
    extrude(amount=IN_PORT_BODY_DEPTH)

    # Sketch10 → 1/8 Rc In Port (revolve, cut)
    with BuildSketch(Plane(origin=(0, -6.5, 12), x_dir=(0, -1, 0), z_dir=(1, 0, 0))):
        Polygon((0, 0), (0, 9), (3.95, 9), (3.95, 8.5), (4.632997221, 8.5), (4.8983385, 0), align=None)
    revolve(axis=Axis((0, -6.5, 18.35), (0, 0, -1)), mode=Mode.SUBTRACT)


with BuildPart() as body_3:
    # Sketch9 → Out Port Body (new body)
    with BuildSketch(Plane(origin=(0, 0, -2.5), x_dir=(-1, 0, 0), z_dir=(0, 0, -1))):
        with BuildLine():
            Line((6.9, -2.679780602), (6.622037052, -10.639597987))
            ThreePointArc((6.622037052, -10.639597987), (5.403107226, -13.377359201), (2.624473744, -14.5))
            Line((2.624473744, -14.5), (-2.624473744, -14.5))
            ThreePointArc((-2.624473744, -14.5), (-5.403107226, -13.377359201), (-6.622037052, -10.639597987))
            Line((-6.622037052, -10.639597987), (-6.9, -2.679780602))
            ThreePointArc((-6.9, -2.679780602), (-6.495131482, -1.47331653), (-5.444444444, -0.75531178))
            ThreePointArc((-5.444444444, -0.75531178), (0, 0), (5.444444444, -0.75531178))
            ThreePointArc((5.444444444, -0.75531178), (6.495131482, -1.47331653), (6.9, -2.679780602))
        make_face()
    extrude(amount=OUT_PORT_BODY_DEPTH)


with BuildPart() as f_1_8_rc_out_port_tool:
    # Sketch12 → 1/8 Rc Out Port (revolve)
    with BuildSketch(Plane(origin=(0, -6.5, -12), x_dir=(0, 1, 0), z_dir=(1, 0, 0))):
        Polygon((0, 0), (0, 12.873399445), (3.95, 10.5), (3.95, 7.4), (4.632997004, 7.4), (4.864, 0), align=None)
    revolve(axis=Axis((0, -6.5, -18.35), (0, 0, 1)))


with BuildPart() as part_1:
    add(part.part)

    # 1/8 Rc Out Port: cut by f_1_8_rc_out_port_tool
    add(f_1_8_rc_out_port_tool.part, mode=Mode.SUBTRACT)

    # Sketch14 → M3 Mounting Holes (revolve, cut)
    with BuildSketch(Plane(origin=(7.5, -14.5, 0), x_dir=(0, 0, -1), z_dir=(1, 0, 0))):
        Polygon((0, 0), (0, 5.751075774), (1.25, 5), (1.25, 0), align=None)
    m3_mounting_holes = revolve(axis=Axis((7.5, -20.85, 0), (0, 1, 0)), mode=Mode.SUBTRACT)

    # M3 Mounting Holes at 2: M3 Mounting Holes ×2
    with Locations(*[(-i * M3_MOUNTING_HOLES_AT_2_PITCH, 0, 0) for i in range(1, M3_MOUNTING_HOLES_AT_2_COUNT)]):
        add(m3_mounting_holes, mode=Mode.SUBTRACT)

    # Sketch21 → Hex Nut (add)
    with BuildSketch(Plane(origin=(0, 42.35, 0), x_dir=(1, 0, 0), z_dir=(0, 1, 0))):
        Polygon((-3.5, 2.020725942), (-3.5, -2.020725942), (0, -4.041451884), (3.5, -2.020725942), (3.5, 2.020725942), (0, 4.041451884), align=None)
        Circle(SKETCH21_R, mode=Mode.SUBTRACT)
    extrude(amount=HEX_NUT_DEPTH)

    # Sketch23 → Hex Nut Detail (revolve, cut)
    with BuildSketch(Plane(origin=(0, 0, 0), x_dir=(0, 0, -1), z_dir=(1, 0, 0))):
        Polygon((-4.041451884, 42.35), (-3.541451884, 42.35), (-4.041451884, 42.85), align=None)
        Polygon((-4.041451884, 45.8), (-3.541451884, 45.8), (-4.041451884, 45.3), align=None)
    revolve(axis=Axis((0, 49.0775, 0), (0, -1, 0)), mode=Mode.SUBTRACT)


with BuildPart() as body_3_1:
    add(body_3.part)

    # 1/8 Rc Out Port: cut by f_1_8_rc_out_port_tool
    add(f_1_8_rc_out_port_tool.part, mode=Mode.SUBTRACT)


solid = Compound([body_2.part, part_1.part, body_3_1.part])
